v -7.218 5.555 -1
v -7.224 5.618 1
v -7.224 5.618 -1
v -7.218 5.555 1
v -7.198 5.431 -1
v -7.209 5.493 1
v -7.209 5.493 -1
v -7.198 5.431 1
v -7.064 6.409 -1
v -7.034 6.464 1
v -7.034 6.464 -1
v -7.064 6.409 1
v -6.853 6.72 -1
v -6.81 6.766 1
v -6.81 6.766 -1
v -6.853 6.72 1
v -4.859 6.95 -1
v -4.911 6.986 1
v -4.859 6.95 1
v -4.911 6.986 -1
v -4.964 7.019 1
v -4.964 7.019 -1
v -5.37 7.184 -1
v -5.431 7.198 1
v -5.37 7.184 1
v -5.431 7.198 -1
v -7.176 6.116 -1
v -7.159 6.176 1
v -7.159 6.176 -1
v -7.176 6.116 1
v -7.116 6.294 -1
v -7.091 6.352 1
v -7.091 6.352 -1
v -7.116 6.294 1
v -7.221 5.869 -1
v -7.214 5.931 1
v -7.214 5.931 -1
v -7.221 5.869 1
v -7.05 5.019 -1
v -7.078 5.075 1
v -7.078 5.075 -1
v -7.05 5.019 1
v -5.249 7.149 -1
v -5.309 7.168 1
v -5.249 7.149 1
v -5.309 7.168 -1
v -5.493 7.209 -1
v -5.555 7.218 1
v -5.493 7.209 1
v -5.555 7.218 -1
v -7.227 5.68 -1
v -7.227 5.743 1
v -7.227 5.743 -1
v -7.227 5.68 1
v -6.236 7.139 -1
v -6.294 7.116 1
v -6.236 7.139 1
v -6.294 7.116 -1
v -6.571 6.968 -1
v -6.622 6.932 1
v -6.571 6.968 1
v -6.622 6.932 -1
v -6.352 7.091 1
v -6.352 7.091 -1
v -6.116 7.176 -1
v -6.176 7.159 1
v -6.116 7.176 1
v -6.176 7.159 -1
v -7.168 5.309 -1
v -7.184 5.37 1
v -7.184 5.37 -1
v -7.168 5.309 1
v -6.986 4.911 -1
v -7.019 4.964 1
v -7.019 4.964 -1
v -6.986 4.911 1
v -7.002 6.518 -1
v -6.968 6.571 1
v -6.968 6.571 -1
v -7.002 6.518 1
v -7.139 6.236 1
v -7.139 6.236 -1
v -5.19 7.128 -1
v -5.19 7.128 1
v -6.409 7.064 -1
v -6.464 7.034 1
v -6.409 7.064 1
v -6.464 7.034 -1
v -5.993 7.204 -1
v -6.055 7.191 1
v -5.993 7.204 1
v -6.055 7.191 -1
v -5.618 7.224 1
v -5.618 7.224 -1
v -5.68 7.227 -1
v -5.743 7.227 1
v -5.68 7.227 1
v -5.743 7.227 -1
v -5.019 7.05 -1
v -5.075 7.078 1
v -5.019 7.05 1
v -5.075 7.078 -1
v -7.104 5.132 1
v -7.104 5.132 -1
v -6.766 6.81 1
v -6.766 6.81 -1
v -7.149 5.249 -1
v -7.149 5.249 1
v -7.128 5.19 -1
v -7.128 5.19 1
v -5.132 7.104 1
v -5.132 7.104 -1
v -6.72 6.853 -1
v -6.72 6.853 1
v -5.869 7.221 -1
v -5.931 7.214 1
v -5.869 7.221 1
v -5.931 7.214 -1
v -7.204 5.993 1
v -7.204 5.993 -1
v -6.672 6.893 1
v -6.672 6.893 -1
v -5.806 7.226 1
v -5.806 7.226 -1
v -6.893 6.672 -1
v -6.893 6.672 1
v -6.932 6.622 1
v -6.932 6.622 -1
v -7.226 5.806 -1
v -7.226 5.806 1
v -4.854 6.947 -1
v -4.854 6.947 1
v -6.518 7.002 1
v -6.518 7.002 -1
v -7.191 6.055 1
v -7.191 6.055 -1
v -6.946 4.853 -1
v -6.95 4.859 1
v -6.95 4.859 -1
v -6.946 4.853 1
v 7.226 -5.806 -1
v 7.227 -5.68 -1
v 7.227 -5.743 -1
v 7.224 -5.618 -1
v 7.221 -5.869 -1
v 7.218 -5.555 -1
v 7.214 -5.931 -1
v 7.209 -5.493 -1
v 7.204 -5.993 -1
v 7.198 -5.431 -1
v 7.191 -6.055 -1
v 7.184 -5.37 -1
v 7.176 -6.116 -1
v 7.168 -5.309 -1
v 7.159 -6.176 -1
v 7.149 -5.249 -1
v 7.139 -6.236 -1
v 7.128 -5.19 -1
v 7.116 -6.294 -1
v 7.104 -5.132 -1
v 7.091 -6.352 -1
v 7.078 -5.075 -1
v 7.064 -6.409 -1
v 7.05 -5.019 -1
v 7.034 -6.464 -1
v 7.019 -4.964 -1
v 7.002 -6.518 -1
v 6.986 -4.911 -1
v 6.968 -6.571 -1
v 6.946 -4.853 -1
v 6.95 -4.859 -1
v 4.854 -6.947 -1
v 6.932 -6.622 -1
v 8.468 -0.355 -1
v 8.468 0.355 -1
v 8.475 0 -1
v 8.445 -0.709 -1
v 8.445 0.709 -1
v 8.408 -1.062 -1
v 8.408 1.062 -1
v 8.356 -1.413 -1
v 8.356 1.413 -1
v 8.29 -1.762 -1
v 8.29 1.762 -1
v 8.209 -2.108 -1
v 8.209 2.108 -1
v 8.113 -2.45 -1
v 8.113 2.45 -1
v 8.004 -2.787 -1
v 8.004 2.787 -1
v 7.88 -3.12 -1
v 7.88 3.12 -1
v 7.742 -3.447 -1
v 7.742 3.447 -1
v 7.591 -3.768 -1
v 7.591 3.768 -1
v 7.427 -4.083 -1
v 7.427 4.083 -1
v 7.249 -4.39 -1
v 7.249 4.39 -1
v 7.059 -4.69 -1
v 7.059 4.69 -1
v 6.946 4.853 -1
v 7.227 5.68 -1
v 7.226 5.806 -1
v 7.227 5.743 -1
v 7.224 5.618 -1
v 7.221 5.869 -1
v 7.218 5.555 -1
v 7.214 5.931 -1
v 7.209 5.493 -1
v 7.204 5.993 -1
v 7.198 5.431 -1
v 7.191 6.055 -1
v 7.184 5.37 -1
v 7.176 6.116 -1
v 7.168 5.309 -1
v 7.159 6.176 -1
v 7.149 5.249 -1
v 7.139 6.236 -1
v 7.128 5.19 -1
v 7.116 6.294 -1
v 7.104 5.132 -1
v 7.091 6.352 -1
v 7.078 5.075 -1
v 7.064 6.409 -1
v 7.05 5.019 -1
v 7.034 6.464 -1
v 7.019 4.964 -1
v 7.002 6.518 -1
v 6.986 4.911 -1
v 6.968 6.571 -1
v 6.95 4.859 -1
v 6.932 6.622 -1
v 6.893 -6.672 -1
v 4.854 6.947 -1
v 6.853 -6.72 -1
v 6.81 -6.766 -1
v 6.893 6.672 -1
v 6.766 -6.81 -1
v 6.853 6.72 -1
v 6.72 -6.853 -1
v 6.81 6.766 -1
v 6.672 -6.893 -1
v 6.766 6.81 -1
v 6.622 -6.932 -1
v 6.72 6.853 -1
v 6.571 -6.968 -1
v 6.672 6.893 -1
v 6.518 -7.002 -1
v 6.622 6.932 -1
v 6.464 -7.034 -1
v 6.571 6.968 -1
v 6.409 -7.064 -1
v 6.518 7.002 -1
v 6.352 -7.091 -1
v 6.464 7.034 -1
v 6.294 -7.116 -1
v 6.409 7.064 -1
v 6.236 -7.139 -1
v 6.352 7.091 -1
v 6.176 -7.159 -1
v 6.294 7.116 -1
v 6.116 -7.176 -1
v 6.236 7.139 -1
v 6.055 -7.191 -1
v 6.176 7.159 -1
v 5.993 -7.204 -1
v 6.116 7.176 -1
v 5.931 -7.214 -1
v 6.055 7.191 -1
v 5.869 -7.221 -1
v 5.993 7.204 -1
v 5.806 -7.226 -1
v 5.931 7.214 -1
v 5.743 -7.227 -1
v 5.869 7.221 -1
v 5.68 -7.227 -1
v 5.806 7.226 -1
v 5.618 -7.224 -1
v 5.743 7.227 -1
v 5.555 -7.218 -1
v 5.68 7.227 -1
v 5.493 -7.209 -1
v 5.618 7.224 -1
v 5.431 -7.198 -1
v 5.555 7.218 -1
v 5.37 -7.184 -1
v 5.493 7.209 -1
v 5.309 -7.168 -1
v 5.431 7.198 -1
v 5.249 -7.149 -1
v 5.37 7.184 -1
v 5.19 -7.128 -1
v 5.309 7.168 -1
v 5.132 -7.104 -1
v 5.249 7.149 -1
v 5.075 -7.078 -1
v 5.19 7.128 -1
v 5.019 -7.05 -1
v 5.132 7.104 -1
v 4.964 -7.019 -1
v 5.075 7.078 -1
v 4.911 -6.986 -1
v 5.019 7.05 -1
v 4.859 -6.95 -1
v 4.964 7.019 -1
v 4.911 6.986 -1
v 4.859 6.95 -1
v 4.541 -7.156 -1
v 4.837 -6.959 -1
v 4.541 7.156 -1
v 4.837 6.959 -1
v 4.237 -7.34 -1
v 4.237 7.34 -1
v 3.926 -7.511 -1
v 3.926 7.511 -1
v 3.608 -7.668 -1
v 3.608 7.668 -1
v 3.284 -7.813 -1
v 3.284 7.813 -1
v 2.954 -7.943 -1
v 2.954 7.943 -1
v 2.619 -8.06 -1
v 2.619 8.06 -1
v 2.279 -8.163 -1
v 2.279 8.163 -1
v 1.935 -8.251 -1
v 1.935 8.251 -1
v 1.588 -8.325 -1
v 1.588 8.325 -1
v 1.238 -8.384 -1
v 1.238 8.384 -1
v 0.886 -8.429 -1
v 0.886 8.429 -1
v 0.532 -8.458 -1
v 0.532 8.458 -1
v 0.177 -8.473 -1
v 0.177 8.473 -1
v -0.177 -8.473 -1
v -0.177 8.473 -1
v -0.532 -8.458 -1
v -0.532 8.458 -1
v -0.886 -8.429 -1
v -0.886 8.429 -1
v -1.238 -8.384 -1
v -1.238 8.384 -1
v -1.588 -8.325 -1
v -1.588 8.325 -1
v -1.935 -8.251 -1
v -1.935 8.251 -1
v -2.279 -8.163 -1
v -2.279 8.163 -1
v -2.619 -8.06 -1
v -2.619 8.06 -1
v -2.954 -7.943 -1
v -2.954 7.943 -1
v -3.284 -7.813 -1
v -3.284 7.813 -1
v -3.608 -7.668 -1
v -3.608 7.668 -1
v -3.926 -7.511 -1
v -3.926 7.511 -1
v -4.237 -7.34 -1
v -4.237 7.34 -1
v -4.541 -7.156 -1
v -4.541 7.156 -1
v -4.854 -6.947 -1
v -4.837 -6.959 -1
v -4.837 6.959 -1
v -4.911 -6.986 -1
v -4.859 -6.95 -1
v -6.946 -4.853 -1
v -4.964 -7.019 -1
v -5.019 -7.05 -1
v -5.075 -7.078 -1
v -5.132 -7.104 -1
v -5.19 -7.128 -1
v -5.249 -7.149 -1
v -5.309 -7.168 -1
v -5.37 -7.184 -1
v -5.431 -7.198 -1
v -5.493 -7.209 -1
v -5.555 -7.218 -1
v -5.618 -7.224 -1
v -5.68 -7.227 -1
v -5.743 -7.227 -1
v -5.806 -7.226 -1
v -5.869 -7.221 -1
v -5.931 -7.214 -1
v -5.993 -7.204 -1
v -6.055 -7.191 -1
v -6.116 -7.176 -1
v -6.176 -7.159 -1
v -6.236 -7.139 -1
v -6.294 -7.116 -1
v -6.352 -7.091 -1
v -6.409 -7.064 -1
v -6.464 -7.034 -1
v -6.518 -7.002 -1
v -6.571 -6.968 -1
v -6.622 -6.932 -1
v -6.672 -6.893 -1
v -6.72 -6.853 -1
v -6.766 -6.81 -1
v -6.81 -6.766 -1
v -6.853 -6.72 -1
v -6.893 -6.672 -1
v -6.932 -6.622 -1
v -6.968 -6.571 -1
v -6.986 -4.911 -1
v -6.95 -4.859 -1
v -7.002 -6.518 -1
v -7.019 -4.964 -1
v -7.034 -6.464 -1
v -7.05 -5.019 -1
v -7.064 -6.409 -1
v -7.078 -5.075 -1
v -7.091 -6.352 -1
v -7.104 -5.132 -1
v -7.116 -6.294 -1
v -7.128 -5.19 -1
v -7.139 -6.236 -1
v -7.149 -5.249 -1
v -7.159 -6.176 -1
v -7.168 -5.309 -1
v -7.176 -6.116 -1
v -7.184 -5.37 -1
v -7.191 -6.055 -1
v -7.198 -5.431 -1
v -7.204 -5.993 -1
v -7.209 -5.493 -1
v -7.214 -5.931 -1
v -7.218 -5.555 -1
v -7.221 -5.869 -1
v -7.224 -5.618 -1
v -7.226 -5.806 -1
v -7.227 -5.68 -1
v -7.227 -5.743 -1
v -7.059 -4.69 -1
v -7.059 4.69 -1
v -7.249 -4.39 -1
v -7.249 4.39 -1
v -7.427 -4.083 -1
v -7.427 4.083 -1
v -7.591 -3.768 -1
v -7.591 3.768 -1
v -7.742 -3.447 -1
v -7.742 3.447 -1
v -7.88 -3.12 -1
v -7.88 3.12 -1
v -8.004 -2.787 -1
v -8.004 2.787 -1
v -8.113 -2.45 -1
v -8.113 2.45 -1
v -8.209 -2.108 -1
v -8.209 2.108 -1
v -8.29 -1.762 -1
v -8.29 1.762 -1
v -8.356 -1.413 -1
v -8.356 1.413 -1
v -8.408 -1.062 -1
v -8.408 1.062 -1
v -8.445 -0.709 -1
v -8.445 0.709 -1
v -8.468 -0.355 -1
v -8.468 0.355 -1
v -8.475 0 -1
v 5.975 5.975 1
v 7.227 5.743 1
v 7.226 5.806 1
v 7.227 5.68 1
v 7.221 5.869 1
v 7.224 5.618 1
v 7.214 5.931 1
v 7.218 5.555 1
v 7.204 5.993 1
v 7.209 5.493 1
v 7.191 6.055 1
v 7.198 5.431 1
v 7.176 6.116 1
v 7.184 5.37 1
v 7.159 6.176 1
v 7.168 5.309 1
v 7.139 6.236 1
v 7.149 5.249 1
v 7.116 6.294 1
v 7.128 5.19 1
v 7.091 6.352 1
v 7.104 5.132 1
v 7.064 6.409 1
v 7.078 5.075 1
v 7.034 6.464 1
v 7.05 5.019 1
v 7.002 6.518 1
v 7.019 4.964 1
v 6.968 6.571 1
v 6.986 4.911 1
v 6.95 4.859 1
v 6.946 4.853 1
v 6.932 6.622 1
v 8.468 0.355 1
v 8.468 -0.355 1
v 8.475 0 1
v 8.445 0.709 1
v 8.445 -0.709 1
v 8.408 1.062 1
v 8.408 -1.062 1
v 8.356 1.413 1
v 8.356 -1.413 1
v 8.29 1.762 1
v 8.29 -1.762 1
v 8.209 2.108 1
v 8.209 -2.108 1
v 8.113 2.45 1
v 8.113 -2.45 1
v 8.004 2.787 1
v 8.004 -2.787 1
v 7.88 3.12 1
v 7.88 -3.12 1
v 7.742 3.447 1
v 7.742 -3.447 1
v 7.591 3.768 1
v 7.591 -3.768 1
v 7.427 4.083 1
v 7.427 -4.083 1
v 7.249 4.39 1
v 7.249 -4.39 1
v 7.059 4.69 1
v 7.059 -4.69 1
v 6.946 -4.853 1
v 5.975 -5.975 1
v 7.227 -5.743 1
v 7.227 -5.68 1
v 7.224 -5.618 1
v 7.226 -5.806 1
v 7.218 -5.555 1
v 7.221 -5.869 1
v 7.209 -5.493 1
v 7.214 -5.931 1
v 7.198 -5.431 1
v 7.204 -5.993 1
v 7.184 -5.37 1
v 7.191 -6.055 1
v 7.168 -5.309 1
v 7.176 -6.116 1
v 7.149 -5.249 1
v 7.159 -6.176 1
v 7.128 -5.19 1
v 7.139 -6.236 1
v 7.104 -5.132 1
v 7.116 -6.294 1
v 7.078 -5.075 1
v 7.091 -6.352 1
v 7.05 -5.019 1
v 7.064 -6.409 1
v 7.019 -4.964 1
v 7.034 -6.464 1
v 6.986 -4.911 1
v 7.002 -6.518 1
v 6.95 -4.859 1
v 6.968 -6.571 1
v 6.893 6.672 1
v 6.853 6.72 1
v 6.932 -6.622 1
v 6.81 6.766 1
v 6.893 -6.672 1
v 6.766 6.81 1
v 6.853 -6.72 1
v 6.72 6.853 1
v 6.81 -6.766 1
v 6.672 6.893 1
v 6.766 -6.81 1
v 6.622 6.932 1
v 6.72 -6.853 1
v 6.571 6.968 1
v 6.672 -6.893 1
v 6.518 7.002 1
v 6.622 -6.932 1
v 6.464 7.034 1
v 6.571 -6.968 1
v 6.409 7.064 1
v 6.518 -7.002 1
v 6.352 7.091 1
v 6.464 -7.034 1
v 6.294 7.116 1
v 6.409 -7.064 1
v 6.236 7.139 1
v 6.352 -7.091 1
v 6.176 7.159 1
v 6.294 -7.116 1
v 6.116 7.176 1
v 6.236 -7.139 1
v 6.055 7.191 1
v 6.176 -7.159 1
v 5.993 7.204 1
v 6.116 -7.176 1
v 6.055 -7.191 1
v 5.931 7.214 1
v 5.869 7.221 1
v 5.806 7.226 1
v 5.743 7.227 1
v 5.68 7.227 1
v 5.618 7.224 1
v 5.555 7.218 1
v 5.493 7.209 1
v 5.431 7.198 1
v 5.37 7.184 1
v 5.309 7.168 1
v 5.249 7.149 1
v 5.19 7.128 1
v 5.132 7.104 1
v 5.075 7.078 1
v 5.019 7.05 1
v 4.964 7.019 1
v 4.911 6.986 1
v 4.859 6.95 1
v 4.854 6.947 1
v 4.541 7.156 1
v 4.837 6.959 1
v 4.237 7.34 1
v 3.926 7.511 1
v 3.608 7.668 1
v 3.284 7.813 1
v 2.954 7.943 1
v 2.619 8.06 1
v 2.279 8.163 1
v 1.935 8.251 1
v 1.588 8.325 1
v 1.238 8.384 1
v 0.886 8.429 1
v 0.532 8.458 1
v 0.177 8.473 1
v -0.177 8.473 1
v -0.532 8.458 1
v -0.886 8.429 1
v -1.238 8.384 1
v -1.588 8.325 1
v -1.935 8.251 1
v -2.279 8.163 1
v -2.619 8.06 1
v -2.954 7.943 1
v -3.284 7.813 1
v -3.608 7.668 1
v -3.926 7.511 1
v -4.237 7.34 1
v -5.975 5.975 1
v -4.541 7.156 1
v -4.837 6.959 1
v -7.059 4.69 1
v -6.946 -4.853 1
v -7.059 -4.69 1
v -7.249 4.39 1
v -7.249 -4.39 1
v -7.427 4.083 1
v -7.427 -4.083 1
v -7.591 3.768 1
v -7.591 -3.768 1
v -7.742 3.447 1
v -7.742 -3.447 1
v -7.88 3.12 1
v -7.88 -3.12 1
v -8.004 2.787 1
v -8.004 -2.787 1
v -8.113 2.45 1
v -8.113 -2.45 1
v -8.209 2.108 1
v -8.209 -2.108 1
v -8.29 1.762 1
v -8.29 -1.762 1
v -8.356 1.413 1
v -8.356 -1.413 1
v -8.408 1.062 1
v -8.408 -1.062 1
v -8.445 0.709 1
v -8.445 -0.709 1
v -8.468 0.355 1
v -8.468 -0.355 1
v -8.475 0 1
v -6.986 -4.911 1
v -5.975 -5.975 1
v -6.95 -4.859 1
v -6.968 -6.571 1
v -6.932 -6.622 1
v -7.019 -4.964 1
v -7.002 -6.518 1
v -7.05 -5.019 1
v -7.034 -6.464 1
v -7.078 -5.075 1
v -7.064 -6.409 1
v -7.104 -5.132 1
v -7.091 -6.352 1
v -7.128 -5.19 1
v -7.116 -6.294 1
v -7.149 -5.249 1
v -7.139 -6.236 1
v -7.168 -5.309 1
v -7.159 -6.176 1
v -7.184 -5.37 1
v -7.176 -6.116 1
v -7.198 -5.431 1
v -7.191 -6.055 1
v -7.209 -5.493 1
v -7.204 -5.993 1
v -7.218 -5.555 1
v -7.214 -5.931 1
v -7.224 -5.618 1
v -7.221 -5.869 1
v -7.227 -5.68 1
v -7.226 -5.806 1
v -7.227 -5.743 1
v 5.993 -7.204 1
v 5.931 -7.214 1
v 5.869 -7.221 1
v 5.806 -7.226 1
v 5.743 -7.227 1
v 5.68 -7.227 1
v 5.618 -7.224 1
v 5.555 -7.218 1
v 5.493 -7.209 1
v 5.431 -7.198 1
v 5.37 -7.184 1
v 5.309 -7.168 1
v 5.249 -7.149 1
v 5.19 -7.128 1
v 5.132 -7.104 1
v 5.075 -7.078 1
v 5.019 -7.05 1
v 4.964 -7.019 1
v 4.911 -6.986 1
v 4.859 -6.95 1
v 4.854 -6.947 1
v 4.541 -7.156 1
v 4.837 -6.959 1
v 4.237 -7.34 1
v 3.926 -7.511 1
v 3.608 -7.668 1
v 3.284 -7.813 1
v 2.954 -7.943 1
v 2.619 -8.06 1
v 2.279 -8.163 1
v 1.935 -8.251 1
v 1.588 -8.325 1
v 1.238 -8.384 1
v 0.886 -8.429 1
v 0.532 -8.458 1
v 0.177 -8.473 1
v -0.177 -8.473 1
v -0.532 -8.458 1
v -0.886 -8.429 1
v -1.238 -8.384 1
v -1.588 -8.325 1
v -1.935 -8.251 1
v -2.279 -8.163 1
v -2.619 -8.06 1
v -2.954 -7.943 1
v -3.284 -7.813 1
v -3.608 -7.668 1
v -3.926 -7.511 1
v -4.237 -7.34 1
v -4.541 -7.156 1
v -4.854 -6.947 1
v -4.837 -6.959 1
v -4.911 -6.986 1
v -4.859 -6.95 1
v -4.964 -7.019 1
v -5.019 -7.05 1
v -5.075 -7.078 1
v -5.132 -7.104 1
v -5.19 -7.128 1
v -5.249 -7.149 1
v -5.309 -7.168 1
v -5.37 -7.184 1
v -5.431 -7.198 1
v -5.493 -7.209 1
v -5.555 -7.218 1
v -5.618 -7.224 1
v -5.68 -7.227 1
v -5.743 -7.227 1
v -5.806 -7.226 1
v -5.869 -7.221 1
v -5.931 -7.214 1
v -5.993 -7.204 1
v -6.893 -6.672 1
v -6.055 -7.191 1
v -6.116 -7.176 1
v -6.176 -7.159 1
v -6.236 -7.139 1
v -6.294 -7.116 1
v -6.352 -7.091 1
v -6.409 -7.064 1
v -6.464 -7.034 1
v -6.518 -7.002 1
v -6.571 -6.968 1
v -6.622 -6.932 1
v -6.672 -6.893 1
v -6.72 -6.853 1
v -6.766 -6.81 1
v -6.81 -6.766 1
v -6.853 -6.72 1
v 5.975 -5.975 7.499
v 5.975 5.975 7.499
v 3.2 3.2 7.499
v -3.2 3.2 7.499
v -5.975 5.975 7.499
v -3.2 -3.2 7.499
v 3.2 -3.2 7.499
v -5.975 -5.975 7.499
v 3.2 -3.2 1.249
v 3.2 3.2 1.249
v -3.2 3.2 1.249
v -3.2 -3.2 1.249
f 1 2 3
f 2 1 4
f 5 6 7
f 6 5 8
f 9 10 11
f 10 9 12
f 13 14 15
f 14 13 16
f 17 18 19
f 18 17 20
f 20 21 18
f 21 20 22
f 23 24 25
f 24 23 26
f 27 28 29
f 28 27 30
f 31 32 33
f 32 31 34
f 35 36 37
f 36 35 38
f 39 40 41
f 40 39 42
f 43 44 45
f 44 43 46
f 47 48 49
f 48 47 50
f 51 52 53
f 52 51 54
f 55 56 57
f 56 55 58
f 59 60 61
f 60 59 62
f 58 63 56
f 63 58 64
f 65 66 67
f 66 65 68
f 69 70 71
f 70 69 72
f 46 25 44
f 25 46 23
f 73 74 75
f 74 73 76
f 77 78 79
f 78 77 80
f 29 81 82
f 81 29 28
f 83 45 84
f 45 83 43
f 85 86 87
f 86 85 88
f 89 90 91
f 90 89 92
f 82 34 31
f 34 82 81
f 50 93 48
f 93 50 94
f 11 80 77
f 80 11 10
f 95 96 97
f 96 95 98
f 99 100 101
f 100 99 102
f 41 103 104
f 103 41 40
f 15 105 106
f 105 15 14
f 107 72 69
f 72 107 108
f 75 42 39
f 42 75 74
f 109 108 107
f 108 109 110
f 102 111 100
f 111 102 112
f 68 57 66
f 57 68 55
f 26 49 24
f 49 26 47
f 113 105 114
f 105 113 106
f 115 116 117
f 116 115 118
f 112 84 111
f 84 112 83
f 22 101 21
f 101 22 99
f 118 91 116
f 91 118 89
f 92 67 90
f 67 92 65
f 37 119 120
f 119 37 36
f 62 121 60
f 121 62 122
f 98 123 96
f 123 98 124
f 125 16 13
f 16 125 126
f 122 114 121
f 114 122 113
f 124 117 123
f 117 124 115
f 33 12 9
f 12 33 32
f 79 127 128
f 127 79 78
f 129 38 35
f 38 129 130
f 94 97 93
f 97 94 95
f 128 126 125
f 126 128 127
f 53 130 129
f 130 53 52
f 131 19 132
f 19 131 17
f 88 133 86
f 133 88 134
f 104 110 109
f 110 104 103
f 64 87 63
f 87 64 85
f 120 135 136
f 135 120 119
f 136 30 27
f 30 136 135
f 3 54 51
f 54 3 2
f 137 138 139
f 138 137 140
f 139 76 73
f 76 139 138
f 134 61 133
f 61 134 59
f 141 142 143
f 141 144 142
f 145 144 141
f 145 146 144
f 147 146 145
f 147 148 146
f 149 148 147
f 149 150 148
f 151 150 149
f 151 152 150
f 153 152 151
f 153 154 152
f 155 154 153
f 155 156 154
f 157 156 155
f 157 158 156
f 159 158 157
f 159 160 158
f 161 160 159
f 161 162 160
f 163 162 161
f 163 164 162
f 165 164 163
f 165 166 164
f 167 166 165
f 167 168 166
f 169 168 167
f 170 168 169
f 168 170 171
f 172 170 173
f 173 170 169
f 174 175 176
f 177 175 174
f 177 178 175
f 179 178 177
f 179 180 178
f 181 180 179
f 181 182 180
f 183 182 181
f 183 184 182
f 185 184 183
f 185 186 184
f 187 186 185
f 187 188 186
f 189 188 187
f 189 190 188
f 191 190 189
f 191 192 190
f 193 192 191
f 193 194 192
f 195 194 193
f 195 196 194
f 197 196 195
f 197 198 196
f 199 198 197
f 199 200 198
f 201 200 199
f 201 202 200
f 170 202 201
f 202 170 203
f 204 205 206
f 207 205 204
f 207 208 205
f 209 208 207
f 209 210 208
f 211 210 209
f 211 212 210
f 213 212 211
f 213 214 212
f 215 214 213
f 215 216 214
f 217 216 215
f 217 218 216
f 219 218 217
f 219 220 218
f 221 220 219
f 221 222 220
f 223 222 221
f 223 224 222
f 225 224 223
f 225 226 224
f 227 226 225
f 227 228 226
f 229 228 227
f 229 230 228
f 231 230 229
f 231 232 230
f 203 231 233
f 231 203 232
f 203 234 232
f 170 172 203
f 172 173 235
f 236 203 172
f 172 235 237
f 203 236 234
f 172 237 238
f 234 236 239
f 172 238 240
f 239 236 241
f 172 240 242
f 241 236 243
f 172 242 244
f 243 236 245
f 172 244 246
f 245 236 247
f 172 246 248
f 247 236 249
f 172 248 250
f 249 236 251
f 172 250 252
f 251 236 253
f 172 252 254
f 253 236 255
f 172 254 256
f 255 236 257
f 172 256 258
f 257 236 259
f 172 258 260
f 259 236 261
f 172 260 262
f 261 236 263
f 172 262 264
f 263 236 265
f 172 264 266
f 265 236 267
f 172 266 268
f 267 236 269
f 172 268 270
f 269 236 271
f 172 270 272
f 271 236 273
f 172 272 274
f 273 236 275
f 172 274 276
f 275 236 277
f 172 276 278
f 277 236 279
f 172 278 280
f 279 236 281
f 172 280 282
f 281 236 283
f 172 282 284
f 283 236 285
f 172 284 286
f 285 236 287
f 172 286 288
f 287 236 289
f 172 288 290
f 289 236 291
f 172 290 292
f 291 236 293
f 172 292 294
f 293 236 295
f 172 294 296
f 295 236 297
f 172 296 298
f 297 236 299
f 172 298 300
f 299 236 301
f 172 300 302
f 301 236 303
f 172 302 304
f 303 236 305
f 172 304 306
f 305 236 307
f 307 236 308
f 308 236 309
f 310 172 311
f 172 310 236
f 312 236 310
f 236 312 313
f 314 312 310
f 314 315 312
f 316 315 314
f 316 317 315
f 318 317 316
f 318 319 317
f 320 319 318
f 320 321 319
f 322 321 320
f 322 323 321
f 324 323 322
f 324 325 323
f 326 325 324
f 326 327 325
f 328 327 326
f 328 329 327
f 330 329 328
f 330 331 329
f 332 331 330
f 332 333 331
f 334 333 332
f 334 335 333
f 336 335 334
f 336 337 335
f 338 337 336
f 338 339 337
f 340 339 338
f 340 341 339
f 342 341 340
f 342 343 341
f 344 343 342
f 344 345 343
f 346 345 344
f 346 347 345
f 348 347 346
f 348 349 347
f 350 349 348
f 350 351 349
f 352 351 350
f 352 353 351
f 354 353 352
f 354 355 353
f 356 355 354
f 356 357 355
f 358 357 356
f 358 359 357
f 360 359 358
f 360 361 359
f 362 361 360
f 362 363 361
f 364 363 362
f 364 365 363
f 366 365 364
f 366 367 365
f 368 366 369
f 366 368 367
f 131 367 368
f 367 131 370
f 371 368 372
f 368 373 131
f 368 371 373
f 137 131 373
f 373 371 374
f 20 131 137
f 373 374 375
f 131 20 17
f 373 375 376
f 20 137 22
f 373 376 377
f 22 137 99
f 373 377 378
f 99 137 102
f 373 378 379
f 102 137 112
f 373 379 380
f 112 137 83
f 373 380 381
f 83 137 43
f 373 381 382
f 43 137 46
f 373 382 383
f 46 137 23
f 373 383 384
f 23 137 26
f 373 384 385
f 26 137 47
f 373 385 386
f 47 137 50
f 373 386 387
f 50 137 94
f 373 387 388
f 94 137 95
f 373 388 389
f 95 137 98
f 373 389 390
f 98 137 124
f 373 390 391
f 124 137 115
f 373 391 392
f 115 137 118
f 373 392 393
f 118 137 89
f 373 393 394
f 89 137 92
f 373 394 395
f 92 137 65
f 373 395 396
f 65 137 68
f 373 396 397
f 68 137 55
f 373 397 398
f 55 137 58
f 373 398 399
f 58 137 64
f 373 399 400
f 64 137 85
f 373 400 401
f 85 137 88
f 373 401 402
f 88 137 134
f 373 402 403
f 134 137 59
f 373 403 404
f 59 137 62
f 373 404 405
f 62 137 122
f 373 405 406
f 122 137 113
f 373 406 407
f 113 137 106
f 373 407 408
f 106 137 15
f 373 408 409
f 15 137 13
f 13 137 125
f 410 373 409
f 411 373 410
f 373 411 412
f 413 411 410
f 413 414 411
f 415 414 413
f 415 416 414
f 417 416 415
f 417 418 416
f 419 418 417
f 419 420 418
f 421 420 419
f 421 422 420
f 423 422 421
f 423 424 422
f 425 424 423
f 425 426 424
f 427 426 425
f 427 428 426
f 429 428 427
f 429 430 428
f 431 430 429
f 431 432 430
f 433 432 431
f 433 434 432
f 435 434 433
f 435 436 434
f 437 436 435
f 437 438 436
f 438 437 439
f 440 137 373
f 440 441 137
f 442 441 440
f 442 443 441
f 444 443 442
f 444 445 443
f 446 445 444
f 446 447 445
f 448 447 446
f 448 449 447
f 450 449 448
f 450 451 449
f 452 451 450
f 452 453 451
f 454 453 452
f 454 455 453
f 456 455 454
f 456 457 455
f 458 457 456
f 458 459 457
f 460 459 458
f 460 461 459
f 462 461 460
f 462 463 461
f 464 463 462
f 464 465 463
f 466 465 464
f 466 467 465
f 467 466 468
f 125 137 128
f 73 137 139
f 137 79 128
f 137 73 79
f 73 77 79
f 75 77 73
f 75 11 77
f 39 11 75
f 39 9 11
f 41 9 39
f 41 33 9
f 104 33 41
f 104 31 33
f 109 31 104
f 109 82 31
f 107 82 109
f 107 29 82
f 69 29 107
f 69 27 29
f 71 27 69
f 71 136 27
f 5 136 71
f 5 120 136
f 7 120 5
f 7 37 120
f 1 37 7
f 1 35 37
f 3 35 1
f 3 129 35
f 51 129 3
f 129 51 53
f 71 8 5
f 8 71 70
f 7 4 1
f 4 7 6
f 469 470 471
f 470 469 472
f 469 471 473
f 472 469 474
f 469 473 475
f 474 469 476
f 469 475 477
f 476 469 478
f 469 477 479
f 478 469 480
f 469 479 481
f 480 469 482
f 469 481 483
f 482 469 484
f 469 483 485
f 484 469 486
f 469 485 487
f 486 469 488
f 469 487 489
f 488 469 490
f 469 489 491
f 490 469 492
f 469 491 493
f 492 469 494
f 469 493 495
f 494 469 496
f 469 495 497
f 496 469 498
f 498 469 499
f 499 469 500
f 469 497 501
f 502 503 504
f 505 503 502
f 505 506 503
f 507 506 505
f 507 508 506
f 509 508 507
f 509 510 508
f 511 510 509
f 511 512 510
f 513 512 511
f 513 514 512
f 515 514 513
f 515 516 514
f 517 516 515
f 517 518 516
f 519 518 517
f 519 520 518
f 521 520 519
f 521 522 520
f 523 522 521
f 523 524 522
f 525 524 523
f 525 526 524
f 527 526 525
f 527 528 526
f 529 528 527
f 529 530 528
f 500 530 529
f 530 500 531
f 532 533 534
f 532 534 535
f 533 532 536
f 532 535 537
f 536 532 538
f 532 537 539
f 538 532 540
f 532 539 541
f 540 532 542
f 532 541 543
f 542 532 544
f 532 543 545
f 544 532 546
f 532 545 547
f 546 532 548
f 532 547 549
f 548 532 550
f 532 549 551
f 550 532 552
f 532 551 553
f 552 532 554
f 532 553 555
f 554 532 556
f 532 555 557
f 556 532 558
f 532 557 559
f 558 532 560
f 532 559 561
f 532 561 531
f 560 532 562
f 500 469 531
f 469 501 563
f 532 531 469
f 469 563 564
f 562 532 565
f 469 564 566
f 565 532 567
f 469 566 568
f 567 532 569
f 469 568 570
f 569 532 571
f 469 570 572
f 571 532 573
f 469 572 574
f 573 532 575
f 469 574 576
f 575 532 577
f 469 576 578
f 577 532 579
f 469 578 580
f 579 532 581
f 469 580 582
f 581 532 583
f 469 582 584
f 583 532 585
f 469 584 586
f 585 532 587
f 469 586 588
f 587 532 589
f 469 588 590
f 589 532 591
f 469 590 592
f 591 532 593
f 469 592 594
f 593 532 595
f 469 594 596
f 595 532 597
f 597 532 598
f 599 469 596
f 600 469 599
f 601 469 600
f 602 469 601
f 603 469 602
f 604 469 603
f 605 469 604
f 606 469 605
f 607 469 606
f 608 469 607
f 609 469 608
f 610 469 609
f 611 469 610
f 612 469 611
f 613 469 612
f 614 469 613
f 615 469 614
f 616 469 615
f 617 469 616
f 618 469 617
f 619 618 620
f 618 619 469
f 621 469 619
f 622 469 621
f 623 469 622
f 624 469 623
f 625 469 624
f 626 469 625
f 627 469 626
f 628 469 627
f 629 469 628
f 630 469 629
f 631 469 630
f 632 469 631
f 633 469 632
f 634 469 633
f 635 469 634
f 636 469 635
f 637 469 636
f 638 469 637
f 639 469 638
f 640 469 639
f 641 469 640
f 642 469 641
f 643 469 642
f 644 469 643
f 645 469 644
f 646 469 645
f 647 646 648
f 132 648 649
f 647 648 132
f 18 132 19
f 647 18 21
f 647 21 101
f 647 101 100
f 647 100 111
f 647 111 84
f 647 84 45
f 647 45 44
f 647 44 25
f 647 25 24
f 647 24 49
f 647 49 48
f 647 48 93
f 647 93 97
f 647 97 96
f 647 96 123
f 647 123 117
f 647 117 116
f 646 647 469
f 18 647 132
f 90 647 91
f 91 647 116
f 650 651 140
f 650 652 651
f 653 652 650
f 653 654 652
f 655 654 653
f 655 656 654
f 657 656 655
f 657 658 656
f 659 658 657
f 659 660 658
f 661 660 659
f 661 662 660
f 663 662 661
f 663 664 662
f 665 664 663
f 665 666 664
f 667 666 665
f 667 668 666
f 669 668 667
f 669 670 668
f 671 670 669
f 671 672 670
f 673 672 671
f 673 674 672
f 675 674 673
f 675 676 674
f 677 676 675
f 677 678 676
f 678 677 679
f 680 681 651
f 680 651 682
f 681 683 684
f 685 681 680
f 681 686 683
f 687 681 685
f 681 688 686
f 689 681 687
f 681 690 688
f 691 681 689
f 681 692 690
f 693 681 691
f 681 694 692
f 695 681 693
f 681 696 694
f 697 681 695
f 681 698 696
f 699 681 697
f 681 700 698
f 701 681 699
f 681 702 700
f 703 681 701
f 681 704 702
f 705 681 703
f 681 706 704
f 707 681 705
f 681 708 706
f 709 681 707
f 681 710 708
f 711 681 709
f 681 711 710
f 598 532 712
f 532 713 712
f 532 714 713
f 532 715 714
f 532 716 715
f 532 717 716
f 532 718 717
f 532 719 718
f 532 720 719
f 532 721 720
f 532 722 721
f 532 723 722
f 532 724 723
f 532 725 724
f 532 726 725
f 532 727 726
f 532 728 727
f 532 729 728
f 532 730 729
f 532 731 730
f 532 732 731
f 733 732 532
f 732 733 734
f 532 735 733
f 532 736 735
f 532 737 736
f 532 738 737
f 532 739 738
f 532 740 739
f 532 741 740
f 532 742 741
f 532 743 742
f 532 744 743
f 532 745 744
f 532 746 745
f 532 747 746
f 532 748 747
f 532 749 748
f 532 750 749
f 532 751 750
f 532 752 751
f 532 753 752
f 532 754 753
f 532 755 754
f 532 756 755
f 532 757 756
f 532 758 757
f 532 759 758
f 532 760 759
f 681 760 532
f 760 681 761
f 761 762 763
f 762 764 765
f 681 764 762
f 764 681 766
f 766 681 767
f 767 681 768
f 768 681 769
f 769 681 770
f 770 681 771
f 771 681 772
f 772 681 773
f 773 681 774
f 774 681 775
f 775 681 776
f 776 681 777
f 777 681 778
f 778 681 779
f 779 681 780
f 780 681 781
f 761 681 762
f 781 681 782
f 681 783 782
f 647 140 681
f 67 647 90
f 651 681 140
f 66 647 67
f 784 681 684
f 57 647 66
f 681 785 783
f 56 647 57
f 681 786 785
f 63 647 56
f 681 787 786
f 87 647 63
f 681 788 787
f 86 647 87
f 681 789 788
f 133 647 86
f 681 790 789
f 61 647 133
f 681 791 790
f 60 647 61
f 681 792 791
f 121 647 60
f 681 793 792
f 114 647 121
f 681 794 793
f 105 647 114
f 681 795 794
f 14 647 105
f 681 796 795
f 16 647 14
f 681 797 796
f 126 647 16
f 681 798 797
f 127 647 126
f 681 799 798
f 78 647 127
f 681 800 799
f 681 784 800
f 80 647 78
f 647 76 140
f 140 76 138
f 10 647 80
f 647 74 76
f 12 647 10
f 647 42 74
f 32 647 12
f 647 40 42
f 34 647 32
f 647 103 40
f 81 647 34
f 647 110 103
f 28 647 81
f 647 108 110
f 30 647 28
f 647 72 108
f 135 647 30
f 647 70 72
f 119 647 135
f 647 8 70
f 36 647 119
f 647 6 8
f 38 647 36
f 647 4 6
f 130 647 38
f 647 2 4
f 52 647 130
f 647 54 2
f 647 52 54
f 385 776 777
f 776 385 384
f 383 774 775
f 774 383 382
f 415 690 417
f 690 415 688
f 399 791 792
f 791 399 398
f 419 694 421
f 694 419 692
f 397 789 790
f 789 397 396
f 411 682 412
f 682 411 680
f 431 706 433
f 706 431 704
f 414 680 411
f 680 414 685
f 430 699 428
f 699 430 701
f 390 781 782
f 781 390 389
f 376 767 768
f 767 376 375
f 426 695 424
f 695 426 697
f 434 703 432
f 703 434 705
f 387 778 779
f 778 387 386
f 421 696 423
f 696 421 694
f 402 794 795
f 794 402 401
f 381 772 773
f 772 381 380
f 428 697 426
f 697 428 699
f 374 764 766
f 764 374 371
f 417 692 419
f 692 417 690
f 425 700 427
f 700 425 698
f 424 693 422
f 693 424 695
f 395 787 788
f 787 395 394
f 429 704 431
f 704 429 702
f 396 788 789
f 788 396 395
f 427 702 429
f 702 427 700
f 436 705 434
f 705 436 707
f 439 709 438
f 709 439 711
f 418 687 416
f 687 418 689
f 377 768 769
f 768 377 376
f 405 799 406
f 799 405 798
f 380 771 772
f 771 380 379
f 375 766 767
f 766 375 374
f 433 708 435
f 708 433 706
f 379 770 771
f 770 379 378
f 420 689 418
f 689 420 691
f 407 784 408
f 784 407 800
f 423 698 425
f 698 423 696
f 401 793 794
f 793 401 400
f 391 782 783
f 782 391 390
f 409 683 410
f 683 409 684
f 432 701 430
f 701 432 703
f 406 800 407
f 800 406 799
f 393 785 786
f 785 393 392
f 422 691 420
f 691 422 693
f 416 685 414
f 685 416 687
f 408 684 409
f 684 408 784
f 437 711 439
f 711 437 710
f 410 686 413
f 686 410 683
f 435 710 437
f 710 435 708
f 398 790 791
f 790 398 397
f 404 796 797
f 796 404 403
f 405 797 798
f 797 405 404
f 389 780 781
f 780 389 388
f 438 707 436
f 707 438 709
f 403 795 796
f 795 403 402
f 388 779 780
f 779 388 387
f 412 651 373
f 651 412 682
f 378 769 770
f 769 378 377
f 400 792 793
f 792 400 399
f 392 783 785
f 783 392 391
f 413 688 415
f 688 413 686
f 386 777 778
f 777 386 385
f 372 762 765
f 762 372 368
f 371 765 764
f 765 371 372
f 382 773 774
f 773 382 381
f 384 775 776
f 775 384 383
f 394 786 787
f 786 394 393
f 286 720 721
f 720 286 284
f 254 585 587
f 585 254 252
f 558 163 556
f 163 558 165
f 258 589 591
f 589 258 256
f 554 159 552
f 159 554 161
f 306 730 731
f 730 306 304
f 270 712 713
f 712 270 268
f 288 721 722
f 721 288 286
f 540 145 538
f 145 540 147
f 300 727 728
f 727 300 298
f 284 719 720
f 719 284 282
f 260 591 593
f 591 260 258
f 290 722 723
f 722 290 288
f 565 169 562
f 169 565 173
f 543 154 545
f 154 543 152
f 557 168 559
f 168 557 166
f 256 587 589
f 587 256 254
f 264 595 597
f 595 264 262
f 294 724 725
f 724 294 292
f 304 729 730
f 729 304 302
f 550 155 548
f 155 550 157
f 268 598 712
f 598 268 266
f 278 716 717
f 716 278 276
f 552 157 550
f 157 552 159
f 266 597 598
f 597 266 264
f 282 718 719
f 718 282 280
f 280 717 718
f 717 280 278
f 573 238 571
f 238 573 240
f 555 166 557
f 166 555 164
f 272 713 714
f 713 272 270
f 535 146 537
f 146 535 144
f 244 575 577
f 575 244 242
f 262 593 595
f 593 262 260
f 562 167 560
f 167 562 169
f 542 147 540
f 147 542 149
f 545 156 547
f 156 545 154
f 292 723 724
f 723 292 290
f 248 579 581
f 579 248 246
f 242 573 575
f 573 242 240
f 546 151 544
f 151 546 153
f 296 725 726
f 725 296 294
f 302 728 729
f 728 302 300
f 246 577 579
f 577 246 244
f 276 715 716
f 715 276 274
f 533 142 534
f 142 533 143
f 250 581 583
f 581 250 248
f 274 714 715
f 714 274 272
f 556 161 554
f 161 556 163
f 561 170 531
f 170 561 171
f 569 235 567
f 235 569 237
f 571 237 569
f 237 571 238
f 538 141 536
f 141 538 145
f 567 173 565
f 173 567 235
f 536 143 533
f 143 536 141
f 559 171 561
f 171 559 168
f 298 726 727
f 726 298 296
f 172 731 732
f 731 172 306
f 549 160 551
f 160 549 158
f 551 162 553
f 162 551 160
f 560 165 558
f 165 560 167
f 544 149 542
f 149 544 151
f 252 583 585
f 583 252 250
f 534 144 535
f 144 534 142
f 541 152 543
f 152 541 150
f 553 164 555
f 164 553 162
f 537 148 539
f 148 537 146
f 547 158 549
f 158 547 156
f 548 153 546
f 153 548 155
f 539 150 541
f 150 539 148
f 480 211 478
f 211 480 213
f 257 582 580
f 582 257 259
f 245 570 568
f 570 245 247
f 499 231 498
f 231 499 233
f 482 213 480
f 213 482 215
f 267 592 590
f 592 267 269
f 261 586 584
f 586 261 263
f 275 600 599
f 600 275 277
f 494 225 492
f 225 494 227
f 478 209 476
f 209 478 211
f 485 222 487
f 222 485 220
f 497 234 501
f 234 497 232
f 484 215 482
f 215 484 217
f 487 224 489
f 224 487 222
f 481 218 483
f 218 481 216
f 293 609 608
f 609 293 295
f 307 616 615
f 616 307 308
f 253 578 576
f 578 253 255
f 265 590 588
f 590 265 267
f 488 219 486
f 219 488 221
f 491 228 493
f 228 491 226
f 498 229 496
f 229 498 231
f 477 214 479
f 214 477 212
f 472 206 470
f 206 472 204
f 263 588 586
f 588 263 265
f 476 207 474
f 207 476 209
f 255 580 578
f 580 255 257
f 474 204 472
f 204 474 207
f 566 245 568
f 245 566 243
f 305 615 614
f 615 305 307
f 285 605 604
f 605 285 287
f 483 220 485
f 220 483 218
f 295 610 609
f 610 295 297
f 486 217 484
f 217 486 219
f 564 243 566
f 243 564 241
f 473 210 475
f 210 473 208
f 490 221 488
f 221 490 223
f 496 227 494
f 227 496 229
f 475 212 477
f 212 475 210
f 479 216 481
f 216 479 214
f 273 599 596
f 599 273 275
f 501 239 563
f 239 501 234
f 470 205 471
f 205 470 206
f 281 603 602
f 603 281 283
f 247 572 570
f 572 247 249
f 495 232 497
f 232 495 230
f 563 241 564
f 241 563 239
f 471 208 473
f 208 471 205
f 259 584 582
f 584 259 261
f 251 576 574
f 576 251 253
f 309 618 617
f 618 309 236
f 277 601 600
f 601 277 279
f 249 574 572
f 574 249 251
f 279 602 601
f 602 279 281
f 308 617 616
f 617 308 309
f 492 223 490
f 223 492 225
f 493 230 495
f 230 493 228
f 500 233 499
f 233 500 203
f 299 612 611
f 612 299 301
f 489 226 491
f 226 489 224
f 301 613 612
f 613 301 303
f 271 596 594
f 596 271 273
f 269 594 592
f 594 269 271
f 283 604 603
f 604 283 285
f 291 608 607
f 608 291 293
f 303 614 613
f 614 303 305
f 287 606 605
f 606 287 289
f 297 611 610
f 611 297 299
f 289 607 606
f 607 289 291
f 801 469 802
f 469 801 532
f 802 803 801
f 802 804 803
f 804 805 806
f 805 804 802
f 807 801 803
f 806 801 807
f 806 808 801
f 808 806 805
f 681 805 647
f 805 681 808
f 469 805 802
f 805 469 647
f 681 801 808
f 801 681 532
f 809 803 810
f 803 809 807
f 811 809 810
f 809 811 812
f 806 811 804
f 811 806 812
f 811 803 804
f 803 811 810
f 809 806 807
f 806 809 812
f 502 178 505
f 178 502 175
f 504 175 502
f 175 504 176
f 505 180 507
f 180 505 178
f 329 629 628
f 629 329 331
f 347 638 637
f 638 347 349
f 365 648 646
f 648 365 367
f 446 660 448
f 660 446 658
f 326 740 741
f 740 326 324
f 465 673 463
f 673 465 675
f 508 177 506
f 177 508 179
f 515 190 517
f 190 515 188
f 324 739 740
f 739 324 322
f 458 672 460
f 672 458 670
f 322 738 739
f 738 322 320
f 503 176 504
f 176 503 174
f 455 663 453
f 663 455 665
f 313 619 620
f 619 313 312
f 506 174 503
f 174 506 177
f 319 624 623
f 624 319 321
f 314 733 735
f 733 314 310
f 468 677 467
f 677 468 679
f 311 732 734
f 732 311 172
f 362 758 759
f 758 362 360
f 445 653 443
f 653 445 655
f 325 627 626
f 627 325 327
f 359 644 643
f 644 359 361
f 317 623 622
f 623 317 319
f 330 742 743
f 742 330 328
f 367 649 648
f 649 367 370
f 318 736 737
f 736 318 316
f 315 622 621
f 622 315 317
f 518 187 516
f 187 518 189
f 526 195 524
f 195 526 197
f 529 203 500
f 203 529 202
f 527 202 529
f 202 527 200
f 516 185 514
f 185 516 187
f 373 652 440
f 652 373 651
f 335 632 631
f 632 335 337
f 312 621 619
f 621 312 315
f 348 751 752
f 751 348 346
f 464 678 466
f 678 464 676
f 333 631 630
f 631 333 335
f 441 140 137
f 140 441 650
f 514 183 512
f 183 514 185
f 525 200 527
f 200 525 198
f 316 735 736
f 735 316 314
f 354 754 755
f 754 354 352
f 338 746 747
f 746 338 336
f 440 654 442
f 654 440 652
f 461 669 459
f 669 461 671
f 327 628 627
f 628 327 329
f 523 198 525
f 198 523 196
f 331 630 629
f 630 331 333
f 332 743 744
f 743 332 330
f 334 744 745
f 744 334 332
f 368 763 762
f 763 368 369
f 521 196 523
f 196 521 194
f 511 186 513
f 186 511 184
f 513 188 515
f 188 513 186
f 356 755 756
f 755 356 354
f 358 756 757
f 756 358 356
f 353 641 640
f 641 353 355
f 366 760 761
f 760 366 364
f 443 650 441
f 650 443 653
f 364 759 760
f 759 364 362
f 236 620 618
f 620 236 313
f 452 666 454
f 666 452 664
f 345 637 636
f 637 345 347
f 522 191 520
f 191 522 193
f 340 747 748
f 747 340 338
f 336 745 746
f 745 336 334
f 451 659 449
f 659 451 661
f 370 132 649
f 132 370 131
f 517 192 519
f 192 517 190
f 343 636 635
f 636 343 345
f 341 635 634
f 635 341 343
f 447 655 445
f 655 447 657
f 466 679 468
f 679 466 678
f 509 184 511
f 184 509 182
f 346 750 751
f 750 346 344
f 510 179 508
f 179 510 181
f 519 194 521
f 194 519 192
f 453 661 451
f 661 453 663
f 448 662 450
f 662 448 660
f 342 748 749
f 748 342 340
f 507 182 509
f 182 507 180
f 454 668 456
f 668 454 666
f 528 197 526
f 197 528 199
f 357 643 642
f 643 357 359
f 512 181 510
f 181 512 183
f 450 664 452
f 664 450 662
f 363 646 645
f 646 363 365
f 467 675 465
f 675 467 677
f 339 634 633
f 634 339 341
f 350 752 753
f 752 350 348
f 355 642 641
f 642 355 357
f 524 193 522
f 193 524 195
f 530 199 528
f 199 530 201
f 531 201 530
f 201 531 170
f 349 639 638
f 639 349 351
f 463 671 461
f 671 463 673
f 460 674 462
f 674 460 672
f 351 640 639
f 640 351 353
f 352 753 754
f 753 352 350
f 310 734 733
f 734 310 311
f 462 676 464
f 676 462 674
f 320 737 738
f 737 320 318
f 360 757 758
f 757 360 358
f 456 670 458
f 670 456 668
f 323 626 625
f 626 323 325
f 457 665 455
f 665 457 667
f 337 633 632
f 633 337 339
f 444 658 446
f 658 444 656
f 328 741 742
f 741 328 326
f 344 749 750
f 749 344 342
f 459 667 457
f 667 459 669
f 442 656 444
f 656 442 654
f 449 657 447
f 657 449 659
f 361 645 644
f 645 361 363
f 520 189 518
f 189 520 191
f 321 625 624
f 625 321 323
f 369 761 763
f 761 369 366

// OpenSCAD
// Wurkkos HD10 Bezel Tool
// Version 1.0

$fn = 150;

///////// Variables
// Width of box for wrench
box_outer_width = 11.95; // 12mm wrench
// box_outer_width = 12.65; // 1/2" wrench

main_diameter = 16.95; // mm - diameter of big cylinder
wing_radius = 1.5; // mm - radius of smaller cylinders
wing_offset = (main_diameter / 2) - (0.25 * wing_radius); // offset inward slightly
main_height = 2.0; // mm - height of cylinder and wings

box_inner_width = 6.4; // mm for 1/4 ratchet
box_height = 6.5; // mm
box_z_offset = (main_height / 2) + (box_height / 2);

///////// Code
// Main cylinder
cylinder(h = main_height, d = main_diameter, center = true);

// Wing circles
for (i = [0:3]) {
    rotate([0, 0, (i * 90) + 45]) {
        translate([0, wing_offset, 0]) {
            cylinder(h = main_height, r = wing_radius, center = true);
        }
    }
}

// Box for wrench
translate([0, 0, box_z_offset-0.001]) { // offset to make sure they form one object
    difference() {
        cube(size = [box_outer_width, box_outer_width, box_height], center = true);
        translate([0, 0, .25]) {
            cube(size = [box_inner_width, box_inner_width, box_height], center = true);
        }
    }
}
